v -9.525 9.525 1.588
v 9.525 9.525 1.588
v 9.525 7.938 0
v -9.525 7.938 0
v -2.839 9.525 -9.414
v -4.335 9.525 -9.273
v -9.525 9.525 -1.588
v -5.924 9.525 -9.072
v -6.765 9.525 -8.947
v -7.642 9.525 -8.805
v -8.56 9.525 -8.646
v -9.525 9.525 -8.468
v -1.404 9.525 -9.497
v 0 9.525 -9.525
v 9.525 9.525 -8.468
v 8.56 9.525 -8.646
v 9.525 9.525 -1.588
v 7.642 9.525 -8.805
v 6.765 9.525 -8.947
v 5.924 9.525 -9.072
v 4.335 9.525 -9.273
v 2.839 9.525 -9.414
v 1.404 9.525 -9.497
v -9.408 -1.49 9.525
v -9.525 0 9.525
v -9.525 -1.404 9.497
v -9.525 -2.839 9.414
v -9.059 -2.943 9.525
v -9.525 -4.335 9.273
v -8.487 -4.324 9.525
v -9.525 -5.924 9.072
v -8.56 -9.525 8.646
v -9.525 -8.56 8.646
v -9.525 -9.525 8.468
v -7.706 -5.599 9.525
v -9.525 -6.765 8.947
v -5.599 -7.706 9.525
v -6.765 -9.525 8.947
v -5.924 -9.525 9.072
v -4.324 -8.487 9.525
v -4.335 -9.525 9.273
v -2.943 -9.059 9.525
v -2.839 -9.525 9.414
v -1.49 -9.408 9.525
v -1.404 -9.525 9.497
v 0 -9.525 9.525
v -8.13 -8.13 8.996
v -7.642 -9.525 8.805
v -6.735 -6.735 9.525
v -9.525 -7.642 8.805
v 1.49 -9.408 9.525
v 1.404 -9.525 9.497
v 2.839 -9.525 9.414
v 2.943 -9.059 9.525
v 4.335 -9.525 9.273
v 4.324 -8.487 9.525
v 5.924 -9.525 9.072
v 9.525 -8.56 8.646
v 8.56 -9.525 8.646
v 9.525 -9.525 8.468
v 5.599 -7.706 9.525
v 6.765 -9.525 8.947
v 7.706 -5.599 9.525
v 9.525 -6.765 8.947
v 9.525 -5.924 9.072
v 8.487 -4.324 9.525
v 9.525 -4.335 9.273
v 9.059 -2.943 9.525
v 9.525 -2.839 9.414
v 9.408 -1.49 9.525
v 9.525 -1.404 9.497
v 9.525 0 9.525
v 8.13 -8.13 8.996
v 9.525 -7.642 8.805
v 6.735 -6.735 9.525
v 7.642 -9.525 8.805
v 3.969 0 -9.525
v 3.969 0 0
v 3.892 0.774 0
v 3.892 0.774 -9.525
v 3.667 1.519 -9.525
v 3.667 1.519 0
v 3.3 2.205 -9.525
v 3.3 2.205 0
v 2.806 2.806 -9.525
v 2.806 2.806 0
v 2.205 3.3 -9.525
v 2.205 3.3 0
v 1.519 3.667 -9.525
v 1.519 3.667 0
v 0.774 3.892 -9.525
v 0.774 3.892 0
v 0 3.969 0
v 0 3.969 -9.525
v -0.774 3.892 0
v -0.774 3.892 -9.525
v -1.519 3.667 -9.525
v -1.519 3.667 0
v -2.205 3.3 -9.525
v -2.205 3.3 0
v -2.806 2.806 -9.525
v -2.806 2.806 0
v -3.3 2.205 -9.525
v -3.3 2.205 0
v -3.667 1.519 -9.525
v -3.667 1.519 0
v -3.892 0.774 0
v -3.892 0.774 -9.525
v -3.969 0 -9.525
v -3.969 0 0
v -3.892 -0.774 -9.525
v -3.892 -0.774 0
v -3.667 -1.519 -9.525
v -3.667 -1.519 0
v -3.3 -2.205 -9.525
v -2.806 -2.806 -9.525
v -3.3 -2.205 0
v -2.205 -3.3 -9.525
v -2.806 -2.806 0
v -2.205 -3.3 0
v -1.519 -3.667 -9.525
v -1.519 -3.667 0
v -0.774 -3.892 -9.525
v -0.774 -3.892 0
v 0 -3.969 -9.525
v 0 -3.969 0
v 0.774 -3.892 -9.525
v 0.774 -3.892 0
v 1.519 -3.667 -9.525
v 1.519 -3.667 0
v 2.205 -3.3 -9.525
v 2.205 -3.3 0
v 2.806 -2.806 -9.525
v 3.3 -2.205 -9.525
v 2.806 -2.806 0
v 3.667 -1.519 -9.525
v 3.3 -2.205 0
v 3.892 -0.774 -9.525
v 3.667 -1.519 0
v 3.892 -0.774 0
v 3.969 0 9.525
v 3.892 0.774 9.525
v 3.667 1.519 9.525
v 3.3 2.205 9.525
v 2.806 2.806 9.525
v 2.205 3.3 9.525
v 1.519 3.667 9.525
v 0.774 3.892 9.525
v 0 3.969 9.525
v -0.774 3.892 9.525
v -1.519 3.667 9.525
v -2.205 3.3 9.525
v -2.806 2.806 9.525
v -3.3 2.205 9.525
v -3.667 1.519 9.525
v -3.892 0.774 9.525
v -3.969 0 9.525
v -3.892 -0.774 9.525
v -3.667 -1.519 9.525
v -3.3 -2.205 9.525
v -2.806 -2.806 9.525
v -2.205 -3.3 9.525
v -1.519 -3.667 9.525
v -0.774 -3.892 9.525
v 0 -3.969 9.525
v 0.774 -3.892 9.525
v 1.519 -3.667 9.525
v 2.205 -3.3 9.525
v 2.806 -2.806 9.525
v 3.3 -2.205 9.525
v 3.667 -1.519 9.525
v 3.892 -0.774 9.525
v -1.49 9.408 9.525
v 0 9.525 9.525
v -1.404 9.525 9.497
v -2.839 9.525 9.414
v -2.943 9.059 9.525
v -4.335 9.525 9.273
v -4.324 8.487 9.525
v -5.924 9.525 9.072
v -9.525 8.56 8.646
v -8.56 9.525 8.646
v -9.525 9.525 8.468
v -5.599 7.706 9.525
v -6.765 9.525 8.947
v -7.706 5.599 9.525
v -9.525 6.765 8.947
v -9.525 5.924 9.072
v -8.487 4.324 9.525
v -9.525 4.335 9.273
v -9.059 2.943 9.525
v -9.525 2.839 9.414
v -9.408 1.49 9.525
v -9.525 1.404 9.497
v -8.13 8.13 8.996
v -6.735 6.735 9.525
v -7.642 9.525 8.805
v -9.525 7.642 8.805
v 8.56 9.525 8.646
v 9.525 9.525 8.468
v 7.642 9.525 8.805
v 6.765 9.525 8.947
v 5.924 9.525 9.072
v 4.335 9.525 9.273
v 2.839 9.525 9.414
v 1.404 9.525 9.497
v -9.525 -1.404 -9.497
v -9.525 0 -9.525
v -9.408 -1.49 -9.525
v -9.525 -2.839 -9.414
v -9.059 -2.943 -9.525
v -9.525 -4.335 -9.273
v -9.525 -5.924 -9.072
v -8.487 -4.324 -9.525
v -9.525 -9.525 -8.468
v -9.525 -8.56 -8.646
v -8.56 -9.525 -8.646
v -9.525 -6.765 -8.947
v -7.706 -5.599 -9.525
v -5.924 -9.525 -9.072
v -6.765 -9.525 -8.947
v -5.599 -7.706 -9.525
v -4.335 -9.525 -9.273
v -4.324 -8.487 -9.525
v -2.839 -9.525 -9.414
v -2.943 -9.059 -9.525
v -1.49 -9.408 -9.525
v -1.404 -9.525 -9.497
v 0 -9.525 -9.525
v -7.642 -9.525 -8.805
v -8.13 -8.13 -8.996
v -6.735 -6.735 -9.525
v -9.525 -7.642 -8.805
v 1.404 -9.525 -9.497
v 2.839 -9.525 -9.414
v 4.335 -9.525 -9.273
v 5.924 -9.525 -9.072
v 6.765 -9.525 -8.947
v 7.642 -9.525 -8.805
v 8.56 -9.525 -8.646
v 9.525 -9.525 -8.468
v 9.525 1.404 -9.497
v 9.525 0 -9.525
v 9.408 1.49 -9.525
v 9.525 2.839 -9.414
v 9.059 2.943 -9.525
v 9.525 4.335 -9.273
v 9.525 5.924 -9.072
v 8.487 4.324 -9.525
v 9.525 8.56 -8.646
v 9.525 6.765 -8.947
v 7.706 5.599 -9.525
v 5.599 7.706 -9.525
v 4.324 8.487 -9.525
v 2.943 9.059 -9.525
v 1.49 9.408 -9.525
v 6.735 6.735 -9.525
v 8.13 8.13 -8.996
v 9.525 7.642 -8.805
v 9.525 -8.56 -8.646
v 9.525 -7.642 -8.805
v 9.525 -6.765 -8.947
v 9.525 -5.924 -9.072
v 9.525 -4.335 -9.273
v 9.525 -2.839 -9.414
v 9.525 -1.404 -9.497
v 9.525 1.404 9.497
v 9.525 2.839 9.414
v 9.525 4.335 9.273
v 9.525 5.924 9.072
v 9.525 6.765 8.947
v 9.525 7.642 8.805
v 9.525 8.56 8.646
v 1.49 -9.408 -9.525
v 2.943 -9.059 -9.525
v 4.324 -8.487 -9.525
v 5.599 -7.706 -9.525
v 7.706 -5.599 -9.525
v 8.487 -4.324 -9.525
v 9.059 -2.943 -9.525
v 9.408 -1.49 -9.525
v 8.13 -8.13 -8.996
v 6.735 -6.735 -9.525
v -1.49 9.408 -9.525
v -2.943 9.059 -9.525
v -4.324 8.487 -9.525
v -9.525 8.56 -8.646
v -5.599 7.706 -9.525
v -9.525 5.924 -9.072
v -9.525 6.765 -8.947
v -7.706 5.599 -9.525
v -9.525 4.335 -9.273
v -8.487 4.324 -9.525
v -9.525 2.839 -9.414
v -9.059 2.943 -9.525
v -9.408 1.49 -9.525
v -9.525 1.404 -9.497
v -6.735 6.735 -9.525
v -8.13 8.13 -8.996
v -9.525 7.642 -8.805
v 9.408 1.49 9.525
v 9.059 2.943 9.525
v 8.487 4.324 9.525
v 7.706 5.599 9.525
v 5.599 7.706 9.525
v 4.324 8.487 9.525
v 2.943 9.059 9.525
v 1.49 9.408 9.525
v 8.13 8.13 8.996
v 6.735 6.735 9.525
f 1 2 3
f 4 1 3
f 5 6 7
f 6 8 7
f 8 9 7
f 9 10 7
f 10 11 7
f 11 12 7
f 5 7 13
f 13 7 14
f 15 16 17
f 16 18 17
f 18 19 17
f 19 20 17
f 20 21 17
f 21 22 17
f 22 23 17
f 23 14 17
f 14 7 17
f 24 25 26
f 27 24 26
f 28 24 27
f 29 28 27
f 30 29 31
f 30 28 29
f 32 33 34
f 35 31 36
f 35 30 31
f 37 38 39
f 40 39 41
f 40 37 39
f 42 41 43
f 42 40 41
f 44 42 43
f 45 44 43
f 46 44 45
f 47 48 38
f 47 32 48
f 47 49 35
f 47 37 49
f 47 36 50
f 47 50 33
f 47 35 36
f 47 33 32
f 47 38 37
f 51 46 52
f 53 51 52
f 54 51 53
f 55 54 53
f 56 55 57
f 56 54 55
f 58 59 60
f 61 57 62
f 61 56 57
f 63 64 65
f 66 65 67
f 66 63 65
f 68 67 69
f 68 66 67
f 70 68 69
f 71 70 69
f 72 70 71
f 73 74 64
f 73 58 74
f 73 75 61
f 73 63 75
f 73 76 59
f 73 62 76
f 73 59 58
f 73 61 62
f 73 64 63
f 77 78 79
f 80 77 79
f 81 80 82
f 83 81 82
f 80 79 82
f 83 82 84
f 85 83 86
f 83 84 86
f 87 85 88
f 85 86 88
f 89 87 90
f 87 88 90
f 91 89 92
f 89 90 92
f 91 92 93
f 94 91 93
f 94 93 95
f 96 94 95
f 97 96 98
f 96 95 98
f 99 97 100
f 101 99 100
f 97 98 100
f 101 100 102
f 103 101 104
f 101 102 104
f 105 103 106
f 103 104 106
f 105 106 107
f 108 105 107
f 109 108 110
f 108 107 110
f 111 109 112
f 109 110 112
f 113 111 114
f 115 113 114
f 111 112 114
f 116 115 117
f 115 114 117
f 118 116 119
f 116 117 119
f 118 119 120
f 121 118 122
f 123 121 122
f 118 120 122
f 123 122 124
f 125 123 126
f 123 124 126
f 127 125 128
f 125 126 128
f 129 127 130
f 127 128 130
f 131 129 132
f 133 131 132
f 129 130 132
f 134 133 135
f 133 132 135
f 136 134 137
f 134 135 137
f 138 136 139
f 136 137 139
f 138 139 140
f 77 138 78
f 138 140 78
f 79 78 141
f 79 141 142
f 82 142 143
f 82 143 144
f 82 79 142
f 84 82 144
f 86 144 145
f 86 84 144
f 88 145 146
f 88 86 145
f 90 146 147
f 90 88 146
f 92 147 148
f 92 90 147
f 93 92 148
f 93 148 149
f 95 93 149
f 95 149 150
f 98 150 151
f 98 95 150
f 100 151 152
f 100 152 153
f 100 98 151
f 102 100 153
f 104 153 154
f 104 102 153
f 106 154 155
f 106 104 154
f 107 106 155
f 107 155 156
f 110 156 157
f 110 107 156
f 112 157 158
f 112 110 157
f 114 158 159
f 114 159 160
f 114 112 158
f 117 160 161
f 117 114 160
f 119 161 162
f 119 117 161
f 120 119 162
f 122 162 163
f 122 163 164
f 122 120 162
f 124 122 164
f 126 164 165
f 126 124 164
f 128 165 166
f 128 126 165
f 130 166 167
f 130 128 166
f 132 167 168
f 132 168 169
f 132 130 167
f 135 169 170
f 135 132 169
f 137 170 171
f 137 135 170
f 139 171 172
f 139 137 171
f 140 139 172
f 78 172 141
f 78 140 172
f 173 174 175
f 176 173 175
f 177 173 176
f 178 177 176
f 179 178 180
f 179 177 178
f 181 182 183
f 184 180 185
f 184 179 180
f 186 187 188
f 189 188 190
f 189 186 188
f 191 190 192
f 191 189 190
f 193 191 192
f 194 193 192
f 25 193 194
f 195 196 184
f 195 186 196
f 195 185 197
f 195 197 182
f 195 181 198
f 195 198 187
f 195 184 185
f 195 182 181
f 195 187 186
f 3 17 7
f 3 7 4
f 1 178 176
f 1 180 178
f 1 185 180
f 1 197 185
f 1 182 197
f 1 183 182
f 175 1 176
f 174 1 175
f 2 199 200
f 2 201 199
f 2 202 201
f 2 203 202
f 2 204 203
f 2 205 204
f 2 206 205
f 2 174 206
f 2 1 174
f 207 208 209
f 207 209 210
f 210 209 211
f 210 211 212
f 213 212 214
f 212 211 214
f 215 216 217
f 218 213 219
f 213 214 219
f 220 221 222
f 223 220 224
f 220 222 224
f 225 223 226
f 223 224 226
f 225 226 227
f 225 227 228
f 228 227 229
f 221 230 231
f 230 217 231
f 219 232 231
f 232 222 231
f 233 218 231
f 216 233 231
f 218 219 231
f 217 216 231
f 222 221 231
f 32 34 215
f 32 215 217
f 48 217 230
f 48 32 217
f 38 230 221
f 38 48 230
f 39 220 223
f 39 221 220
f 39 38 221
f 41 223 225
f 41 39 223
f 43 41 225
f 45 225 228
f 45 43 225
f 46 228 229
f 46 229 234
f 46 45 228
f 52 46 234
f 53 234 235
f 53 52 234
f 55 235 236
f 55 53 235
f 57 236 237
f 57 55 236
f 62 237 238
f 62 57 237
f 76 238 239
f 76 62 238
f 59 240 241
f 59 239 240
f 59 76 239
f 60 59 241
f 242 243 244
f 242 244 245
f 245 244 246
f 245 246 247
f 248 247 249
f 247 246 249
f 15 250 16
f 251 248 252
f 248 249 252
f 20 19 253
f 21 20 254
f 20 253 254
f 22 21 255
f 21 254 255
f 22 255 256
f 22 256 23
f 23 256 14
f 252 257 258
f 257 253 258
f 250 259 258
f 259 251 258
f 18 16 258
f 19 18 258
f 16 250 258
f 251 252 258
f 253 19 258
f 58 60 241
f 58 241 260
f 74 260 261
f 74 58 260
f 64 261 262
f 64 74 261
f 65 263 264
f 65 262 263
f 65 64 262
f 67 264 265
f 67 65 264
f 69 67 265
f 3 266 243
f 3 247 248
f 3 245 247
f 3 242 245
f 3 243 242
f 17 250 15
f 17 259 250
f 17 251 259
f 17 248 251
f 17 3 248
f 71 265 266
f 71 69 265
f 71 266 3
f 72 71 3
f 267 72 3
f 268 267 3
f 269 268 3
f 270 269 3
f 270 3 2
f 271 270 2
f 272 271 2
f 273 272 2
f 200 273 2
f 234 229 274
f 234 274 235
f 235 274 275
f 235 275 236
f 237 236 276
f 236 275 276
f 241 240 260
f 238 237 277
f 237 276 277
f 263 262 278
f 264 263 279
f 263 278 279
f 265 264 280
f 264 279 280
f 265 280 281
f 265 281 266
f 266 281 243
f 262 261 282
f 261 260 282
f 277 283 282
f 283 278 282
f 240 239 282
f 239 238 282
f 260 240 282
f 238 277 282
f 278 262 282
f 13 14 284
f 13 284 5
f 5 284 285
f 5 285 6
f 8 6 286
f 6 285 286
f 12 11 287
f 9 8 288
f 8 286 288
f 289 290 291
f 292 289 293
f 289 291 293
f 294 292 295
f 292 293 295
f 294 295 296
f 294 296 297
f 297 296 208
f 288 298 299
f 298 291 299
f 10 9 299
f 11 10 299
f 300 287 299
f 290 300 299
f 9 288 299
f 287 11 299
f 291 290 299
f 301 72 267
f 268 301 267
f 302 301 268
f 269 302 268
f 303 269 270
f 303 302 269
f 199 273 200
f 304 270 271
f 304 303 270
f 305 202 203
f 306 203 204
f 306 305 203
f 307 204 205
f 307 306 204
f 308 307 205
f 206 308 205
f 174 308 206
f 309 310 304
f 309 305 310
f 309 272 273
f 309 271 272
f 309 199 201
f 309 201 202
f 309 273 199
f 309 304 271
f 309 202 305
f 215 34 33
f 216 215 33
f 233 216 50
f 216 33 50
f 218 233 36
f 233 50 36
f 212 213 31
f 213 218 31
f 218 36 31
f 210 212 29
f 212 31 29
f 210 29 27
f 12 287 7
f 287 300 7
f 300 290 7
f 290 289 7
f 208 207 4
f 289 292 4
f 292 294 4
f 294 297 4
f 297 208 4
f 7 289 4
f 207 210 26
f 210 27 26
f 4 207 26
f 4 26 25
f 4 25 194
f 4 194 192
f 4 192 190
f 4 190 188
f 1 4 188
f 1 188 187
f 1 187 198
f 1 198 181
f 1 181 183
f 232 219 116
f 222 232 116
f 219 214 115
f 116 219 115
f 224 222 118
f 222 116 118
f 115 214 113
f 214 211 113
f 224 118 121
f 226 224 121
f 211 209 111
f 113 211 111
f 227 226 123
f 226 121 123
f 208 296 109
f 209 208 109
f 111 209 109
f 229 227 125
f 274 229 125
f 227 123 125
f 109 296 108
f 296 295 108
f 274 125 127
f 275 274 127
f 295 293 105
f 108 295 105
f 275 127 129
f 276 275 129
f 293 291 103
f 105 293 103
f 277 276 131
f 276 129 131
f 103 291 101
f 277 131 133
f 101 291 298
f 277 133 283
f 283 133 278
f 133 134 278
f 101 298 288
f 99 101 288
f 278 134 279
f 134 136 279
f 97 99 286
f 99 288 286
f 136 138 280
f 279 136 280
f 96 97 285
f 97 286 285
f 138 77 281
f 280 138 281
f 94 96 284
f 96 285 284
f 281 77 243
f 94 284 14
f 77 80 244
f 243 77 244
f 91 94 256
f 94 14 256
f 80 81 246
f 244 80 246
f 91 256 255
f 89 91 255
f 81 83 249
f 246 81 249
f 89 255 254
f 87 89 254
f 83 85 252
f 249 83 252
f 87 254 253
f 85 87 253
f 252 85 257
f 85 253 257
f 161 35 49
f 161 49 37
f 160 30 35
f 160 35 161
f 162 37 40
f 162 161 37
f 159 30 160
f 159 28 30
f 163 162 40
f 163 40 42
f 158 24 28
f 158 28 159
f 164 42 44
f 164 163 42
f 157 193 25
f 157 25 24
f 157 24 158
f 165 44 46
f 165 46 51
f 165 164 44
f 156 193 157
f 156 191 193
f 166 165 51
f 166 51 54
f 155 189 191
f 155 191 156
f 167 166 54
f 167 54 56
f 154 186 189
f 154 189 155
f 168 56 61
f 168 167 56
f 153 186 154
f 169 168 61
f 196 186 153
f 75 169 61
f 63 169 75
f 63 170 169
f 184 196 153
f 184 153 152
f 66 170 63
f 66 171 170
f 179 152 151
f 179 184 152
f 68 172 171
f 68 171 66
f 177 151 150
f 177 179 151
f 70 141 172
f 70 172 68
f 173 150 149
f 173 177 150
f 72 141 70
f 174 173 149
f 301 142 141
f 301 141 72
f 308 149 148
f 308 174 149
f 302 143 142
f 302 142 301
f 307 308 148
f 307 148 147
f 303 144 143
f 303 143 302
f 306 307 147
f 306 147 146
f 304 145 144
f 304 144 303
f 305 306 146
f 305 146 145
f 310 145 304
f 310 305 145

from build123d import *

# Parameters (mm, degrees)
F0_W     = 19.05
F0_H     = 19.05
F0_R     = 3.96875
F1_DEPTH = 9.525
F6_DEPTH = 19.051


with BuildPart() as f1:
    # F0 (on Top) → F1 (new body)
    with BuildSketch(Plane.XY):
        Rectangle(F0_W, F0_H)
        Circle(F0_R, mode=Mode.SUBTRACT)
    extrude(amount=F1_DEPTH)

    # F4: sweep along a path in F2
    with BuildLine(Plane.XY.offset(9.525)) as f4_path:
        CenterArc((0, 0), 9.525, 0, 360)
    # F3 (on Right) → F4 (sweep, cut)
    with BuildSketch(Plane.YZ):
        Polygon((-14.469163, 8.200215), (-9.525, 9.525), (-14.469163, 9.525), align=None)
    sweep(path=f4_path.line, mode=Mode.SUBTRACT)

    # F5 (on face) → F6 (cut, through all)
    with BuildSketch(Plane.YZ.offset(9.525)):
        Polygon((7.9375, 0), (9.525, 0), (9.525, 1.5875), align=None)
    extrude(amount=-F6_DEPTH, mode=Mode.SUBTRACT)

    # F7: F1 across face


with BuildPart() as f1_1:
    add(f1.part)
    add(f1.part.mirror(Plane(origin=(0, -0.932452, 0), x_dir=(1, 0, 0), z_dir=(0, 0, -1))))


solid = f1_1.part
